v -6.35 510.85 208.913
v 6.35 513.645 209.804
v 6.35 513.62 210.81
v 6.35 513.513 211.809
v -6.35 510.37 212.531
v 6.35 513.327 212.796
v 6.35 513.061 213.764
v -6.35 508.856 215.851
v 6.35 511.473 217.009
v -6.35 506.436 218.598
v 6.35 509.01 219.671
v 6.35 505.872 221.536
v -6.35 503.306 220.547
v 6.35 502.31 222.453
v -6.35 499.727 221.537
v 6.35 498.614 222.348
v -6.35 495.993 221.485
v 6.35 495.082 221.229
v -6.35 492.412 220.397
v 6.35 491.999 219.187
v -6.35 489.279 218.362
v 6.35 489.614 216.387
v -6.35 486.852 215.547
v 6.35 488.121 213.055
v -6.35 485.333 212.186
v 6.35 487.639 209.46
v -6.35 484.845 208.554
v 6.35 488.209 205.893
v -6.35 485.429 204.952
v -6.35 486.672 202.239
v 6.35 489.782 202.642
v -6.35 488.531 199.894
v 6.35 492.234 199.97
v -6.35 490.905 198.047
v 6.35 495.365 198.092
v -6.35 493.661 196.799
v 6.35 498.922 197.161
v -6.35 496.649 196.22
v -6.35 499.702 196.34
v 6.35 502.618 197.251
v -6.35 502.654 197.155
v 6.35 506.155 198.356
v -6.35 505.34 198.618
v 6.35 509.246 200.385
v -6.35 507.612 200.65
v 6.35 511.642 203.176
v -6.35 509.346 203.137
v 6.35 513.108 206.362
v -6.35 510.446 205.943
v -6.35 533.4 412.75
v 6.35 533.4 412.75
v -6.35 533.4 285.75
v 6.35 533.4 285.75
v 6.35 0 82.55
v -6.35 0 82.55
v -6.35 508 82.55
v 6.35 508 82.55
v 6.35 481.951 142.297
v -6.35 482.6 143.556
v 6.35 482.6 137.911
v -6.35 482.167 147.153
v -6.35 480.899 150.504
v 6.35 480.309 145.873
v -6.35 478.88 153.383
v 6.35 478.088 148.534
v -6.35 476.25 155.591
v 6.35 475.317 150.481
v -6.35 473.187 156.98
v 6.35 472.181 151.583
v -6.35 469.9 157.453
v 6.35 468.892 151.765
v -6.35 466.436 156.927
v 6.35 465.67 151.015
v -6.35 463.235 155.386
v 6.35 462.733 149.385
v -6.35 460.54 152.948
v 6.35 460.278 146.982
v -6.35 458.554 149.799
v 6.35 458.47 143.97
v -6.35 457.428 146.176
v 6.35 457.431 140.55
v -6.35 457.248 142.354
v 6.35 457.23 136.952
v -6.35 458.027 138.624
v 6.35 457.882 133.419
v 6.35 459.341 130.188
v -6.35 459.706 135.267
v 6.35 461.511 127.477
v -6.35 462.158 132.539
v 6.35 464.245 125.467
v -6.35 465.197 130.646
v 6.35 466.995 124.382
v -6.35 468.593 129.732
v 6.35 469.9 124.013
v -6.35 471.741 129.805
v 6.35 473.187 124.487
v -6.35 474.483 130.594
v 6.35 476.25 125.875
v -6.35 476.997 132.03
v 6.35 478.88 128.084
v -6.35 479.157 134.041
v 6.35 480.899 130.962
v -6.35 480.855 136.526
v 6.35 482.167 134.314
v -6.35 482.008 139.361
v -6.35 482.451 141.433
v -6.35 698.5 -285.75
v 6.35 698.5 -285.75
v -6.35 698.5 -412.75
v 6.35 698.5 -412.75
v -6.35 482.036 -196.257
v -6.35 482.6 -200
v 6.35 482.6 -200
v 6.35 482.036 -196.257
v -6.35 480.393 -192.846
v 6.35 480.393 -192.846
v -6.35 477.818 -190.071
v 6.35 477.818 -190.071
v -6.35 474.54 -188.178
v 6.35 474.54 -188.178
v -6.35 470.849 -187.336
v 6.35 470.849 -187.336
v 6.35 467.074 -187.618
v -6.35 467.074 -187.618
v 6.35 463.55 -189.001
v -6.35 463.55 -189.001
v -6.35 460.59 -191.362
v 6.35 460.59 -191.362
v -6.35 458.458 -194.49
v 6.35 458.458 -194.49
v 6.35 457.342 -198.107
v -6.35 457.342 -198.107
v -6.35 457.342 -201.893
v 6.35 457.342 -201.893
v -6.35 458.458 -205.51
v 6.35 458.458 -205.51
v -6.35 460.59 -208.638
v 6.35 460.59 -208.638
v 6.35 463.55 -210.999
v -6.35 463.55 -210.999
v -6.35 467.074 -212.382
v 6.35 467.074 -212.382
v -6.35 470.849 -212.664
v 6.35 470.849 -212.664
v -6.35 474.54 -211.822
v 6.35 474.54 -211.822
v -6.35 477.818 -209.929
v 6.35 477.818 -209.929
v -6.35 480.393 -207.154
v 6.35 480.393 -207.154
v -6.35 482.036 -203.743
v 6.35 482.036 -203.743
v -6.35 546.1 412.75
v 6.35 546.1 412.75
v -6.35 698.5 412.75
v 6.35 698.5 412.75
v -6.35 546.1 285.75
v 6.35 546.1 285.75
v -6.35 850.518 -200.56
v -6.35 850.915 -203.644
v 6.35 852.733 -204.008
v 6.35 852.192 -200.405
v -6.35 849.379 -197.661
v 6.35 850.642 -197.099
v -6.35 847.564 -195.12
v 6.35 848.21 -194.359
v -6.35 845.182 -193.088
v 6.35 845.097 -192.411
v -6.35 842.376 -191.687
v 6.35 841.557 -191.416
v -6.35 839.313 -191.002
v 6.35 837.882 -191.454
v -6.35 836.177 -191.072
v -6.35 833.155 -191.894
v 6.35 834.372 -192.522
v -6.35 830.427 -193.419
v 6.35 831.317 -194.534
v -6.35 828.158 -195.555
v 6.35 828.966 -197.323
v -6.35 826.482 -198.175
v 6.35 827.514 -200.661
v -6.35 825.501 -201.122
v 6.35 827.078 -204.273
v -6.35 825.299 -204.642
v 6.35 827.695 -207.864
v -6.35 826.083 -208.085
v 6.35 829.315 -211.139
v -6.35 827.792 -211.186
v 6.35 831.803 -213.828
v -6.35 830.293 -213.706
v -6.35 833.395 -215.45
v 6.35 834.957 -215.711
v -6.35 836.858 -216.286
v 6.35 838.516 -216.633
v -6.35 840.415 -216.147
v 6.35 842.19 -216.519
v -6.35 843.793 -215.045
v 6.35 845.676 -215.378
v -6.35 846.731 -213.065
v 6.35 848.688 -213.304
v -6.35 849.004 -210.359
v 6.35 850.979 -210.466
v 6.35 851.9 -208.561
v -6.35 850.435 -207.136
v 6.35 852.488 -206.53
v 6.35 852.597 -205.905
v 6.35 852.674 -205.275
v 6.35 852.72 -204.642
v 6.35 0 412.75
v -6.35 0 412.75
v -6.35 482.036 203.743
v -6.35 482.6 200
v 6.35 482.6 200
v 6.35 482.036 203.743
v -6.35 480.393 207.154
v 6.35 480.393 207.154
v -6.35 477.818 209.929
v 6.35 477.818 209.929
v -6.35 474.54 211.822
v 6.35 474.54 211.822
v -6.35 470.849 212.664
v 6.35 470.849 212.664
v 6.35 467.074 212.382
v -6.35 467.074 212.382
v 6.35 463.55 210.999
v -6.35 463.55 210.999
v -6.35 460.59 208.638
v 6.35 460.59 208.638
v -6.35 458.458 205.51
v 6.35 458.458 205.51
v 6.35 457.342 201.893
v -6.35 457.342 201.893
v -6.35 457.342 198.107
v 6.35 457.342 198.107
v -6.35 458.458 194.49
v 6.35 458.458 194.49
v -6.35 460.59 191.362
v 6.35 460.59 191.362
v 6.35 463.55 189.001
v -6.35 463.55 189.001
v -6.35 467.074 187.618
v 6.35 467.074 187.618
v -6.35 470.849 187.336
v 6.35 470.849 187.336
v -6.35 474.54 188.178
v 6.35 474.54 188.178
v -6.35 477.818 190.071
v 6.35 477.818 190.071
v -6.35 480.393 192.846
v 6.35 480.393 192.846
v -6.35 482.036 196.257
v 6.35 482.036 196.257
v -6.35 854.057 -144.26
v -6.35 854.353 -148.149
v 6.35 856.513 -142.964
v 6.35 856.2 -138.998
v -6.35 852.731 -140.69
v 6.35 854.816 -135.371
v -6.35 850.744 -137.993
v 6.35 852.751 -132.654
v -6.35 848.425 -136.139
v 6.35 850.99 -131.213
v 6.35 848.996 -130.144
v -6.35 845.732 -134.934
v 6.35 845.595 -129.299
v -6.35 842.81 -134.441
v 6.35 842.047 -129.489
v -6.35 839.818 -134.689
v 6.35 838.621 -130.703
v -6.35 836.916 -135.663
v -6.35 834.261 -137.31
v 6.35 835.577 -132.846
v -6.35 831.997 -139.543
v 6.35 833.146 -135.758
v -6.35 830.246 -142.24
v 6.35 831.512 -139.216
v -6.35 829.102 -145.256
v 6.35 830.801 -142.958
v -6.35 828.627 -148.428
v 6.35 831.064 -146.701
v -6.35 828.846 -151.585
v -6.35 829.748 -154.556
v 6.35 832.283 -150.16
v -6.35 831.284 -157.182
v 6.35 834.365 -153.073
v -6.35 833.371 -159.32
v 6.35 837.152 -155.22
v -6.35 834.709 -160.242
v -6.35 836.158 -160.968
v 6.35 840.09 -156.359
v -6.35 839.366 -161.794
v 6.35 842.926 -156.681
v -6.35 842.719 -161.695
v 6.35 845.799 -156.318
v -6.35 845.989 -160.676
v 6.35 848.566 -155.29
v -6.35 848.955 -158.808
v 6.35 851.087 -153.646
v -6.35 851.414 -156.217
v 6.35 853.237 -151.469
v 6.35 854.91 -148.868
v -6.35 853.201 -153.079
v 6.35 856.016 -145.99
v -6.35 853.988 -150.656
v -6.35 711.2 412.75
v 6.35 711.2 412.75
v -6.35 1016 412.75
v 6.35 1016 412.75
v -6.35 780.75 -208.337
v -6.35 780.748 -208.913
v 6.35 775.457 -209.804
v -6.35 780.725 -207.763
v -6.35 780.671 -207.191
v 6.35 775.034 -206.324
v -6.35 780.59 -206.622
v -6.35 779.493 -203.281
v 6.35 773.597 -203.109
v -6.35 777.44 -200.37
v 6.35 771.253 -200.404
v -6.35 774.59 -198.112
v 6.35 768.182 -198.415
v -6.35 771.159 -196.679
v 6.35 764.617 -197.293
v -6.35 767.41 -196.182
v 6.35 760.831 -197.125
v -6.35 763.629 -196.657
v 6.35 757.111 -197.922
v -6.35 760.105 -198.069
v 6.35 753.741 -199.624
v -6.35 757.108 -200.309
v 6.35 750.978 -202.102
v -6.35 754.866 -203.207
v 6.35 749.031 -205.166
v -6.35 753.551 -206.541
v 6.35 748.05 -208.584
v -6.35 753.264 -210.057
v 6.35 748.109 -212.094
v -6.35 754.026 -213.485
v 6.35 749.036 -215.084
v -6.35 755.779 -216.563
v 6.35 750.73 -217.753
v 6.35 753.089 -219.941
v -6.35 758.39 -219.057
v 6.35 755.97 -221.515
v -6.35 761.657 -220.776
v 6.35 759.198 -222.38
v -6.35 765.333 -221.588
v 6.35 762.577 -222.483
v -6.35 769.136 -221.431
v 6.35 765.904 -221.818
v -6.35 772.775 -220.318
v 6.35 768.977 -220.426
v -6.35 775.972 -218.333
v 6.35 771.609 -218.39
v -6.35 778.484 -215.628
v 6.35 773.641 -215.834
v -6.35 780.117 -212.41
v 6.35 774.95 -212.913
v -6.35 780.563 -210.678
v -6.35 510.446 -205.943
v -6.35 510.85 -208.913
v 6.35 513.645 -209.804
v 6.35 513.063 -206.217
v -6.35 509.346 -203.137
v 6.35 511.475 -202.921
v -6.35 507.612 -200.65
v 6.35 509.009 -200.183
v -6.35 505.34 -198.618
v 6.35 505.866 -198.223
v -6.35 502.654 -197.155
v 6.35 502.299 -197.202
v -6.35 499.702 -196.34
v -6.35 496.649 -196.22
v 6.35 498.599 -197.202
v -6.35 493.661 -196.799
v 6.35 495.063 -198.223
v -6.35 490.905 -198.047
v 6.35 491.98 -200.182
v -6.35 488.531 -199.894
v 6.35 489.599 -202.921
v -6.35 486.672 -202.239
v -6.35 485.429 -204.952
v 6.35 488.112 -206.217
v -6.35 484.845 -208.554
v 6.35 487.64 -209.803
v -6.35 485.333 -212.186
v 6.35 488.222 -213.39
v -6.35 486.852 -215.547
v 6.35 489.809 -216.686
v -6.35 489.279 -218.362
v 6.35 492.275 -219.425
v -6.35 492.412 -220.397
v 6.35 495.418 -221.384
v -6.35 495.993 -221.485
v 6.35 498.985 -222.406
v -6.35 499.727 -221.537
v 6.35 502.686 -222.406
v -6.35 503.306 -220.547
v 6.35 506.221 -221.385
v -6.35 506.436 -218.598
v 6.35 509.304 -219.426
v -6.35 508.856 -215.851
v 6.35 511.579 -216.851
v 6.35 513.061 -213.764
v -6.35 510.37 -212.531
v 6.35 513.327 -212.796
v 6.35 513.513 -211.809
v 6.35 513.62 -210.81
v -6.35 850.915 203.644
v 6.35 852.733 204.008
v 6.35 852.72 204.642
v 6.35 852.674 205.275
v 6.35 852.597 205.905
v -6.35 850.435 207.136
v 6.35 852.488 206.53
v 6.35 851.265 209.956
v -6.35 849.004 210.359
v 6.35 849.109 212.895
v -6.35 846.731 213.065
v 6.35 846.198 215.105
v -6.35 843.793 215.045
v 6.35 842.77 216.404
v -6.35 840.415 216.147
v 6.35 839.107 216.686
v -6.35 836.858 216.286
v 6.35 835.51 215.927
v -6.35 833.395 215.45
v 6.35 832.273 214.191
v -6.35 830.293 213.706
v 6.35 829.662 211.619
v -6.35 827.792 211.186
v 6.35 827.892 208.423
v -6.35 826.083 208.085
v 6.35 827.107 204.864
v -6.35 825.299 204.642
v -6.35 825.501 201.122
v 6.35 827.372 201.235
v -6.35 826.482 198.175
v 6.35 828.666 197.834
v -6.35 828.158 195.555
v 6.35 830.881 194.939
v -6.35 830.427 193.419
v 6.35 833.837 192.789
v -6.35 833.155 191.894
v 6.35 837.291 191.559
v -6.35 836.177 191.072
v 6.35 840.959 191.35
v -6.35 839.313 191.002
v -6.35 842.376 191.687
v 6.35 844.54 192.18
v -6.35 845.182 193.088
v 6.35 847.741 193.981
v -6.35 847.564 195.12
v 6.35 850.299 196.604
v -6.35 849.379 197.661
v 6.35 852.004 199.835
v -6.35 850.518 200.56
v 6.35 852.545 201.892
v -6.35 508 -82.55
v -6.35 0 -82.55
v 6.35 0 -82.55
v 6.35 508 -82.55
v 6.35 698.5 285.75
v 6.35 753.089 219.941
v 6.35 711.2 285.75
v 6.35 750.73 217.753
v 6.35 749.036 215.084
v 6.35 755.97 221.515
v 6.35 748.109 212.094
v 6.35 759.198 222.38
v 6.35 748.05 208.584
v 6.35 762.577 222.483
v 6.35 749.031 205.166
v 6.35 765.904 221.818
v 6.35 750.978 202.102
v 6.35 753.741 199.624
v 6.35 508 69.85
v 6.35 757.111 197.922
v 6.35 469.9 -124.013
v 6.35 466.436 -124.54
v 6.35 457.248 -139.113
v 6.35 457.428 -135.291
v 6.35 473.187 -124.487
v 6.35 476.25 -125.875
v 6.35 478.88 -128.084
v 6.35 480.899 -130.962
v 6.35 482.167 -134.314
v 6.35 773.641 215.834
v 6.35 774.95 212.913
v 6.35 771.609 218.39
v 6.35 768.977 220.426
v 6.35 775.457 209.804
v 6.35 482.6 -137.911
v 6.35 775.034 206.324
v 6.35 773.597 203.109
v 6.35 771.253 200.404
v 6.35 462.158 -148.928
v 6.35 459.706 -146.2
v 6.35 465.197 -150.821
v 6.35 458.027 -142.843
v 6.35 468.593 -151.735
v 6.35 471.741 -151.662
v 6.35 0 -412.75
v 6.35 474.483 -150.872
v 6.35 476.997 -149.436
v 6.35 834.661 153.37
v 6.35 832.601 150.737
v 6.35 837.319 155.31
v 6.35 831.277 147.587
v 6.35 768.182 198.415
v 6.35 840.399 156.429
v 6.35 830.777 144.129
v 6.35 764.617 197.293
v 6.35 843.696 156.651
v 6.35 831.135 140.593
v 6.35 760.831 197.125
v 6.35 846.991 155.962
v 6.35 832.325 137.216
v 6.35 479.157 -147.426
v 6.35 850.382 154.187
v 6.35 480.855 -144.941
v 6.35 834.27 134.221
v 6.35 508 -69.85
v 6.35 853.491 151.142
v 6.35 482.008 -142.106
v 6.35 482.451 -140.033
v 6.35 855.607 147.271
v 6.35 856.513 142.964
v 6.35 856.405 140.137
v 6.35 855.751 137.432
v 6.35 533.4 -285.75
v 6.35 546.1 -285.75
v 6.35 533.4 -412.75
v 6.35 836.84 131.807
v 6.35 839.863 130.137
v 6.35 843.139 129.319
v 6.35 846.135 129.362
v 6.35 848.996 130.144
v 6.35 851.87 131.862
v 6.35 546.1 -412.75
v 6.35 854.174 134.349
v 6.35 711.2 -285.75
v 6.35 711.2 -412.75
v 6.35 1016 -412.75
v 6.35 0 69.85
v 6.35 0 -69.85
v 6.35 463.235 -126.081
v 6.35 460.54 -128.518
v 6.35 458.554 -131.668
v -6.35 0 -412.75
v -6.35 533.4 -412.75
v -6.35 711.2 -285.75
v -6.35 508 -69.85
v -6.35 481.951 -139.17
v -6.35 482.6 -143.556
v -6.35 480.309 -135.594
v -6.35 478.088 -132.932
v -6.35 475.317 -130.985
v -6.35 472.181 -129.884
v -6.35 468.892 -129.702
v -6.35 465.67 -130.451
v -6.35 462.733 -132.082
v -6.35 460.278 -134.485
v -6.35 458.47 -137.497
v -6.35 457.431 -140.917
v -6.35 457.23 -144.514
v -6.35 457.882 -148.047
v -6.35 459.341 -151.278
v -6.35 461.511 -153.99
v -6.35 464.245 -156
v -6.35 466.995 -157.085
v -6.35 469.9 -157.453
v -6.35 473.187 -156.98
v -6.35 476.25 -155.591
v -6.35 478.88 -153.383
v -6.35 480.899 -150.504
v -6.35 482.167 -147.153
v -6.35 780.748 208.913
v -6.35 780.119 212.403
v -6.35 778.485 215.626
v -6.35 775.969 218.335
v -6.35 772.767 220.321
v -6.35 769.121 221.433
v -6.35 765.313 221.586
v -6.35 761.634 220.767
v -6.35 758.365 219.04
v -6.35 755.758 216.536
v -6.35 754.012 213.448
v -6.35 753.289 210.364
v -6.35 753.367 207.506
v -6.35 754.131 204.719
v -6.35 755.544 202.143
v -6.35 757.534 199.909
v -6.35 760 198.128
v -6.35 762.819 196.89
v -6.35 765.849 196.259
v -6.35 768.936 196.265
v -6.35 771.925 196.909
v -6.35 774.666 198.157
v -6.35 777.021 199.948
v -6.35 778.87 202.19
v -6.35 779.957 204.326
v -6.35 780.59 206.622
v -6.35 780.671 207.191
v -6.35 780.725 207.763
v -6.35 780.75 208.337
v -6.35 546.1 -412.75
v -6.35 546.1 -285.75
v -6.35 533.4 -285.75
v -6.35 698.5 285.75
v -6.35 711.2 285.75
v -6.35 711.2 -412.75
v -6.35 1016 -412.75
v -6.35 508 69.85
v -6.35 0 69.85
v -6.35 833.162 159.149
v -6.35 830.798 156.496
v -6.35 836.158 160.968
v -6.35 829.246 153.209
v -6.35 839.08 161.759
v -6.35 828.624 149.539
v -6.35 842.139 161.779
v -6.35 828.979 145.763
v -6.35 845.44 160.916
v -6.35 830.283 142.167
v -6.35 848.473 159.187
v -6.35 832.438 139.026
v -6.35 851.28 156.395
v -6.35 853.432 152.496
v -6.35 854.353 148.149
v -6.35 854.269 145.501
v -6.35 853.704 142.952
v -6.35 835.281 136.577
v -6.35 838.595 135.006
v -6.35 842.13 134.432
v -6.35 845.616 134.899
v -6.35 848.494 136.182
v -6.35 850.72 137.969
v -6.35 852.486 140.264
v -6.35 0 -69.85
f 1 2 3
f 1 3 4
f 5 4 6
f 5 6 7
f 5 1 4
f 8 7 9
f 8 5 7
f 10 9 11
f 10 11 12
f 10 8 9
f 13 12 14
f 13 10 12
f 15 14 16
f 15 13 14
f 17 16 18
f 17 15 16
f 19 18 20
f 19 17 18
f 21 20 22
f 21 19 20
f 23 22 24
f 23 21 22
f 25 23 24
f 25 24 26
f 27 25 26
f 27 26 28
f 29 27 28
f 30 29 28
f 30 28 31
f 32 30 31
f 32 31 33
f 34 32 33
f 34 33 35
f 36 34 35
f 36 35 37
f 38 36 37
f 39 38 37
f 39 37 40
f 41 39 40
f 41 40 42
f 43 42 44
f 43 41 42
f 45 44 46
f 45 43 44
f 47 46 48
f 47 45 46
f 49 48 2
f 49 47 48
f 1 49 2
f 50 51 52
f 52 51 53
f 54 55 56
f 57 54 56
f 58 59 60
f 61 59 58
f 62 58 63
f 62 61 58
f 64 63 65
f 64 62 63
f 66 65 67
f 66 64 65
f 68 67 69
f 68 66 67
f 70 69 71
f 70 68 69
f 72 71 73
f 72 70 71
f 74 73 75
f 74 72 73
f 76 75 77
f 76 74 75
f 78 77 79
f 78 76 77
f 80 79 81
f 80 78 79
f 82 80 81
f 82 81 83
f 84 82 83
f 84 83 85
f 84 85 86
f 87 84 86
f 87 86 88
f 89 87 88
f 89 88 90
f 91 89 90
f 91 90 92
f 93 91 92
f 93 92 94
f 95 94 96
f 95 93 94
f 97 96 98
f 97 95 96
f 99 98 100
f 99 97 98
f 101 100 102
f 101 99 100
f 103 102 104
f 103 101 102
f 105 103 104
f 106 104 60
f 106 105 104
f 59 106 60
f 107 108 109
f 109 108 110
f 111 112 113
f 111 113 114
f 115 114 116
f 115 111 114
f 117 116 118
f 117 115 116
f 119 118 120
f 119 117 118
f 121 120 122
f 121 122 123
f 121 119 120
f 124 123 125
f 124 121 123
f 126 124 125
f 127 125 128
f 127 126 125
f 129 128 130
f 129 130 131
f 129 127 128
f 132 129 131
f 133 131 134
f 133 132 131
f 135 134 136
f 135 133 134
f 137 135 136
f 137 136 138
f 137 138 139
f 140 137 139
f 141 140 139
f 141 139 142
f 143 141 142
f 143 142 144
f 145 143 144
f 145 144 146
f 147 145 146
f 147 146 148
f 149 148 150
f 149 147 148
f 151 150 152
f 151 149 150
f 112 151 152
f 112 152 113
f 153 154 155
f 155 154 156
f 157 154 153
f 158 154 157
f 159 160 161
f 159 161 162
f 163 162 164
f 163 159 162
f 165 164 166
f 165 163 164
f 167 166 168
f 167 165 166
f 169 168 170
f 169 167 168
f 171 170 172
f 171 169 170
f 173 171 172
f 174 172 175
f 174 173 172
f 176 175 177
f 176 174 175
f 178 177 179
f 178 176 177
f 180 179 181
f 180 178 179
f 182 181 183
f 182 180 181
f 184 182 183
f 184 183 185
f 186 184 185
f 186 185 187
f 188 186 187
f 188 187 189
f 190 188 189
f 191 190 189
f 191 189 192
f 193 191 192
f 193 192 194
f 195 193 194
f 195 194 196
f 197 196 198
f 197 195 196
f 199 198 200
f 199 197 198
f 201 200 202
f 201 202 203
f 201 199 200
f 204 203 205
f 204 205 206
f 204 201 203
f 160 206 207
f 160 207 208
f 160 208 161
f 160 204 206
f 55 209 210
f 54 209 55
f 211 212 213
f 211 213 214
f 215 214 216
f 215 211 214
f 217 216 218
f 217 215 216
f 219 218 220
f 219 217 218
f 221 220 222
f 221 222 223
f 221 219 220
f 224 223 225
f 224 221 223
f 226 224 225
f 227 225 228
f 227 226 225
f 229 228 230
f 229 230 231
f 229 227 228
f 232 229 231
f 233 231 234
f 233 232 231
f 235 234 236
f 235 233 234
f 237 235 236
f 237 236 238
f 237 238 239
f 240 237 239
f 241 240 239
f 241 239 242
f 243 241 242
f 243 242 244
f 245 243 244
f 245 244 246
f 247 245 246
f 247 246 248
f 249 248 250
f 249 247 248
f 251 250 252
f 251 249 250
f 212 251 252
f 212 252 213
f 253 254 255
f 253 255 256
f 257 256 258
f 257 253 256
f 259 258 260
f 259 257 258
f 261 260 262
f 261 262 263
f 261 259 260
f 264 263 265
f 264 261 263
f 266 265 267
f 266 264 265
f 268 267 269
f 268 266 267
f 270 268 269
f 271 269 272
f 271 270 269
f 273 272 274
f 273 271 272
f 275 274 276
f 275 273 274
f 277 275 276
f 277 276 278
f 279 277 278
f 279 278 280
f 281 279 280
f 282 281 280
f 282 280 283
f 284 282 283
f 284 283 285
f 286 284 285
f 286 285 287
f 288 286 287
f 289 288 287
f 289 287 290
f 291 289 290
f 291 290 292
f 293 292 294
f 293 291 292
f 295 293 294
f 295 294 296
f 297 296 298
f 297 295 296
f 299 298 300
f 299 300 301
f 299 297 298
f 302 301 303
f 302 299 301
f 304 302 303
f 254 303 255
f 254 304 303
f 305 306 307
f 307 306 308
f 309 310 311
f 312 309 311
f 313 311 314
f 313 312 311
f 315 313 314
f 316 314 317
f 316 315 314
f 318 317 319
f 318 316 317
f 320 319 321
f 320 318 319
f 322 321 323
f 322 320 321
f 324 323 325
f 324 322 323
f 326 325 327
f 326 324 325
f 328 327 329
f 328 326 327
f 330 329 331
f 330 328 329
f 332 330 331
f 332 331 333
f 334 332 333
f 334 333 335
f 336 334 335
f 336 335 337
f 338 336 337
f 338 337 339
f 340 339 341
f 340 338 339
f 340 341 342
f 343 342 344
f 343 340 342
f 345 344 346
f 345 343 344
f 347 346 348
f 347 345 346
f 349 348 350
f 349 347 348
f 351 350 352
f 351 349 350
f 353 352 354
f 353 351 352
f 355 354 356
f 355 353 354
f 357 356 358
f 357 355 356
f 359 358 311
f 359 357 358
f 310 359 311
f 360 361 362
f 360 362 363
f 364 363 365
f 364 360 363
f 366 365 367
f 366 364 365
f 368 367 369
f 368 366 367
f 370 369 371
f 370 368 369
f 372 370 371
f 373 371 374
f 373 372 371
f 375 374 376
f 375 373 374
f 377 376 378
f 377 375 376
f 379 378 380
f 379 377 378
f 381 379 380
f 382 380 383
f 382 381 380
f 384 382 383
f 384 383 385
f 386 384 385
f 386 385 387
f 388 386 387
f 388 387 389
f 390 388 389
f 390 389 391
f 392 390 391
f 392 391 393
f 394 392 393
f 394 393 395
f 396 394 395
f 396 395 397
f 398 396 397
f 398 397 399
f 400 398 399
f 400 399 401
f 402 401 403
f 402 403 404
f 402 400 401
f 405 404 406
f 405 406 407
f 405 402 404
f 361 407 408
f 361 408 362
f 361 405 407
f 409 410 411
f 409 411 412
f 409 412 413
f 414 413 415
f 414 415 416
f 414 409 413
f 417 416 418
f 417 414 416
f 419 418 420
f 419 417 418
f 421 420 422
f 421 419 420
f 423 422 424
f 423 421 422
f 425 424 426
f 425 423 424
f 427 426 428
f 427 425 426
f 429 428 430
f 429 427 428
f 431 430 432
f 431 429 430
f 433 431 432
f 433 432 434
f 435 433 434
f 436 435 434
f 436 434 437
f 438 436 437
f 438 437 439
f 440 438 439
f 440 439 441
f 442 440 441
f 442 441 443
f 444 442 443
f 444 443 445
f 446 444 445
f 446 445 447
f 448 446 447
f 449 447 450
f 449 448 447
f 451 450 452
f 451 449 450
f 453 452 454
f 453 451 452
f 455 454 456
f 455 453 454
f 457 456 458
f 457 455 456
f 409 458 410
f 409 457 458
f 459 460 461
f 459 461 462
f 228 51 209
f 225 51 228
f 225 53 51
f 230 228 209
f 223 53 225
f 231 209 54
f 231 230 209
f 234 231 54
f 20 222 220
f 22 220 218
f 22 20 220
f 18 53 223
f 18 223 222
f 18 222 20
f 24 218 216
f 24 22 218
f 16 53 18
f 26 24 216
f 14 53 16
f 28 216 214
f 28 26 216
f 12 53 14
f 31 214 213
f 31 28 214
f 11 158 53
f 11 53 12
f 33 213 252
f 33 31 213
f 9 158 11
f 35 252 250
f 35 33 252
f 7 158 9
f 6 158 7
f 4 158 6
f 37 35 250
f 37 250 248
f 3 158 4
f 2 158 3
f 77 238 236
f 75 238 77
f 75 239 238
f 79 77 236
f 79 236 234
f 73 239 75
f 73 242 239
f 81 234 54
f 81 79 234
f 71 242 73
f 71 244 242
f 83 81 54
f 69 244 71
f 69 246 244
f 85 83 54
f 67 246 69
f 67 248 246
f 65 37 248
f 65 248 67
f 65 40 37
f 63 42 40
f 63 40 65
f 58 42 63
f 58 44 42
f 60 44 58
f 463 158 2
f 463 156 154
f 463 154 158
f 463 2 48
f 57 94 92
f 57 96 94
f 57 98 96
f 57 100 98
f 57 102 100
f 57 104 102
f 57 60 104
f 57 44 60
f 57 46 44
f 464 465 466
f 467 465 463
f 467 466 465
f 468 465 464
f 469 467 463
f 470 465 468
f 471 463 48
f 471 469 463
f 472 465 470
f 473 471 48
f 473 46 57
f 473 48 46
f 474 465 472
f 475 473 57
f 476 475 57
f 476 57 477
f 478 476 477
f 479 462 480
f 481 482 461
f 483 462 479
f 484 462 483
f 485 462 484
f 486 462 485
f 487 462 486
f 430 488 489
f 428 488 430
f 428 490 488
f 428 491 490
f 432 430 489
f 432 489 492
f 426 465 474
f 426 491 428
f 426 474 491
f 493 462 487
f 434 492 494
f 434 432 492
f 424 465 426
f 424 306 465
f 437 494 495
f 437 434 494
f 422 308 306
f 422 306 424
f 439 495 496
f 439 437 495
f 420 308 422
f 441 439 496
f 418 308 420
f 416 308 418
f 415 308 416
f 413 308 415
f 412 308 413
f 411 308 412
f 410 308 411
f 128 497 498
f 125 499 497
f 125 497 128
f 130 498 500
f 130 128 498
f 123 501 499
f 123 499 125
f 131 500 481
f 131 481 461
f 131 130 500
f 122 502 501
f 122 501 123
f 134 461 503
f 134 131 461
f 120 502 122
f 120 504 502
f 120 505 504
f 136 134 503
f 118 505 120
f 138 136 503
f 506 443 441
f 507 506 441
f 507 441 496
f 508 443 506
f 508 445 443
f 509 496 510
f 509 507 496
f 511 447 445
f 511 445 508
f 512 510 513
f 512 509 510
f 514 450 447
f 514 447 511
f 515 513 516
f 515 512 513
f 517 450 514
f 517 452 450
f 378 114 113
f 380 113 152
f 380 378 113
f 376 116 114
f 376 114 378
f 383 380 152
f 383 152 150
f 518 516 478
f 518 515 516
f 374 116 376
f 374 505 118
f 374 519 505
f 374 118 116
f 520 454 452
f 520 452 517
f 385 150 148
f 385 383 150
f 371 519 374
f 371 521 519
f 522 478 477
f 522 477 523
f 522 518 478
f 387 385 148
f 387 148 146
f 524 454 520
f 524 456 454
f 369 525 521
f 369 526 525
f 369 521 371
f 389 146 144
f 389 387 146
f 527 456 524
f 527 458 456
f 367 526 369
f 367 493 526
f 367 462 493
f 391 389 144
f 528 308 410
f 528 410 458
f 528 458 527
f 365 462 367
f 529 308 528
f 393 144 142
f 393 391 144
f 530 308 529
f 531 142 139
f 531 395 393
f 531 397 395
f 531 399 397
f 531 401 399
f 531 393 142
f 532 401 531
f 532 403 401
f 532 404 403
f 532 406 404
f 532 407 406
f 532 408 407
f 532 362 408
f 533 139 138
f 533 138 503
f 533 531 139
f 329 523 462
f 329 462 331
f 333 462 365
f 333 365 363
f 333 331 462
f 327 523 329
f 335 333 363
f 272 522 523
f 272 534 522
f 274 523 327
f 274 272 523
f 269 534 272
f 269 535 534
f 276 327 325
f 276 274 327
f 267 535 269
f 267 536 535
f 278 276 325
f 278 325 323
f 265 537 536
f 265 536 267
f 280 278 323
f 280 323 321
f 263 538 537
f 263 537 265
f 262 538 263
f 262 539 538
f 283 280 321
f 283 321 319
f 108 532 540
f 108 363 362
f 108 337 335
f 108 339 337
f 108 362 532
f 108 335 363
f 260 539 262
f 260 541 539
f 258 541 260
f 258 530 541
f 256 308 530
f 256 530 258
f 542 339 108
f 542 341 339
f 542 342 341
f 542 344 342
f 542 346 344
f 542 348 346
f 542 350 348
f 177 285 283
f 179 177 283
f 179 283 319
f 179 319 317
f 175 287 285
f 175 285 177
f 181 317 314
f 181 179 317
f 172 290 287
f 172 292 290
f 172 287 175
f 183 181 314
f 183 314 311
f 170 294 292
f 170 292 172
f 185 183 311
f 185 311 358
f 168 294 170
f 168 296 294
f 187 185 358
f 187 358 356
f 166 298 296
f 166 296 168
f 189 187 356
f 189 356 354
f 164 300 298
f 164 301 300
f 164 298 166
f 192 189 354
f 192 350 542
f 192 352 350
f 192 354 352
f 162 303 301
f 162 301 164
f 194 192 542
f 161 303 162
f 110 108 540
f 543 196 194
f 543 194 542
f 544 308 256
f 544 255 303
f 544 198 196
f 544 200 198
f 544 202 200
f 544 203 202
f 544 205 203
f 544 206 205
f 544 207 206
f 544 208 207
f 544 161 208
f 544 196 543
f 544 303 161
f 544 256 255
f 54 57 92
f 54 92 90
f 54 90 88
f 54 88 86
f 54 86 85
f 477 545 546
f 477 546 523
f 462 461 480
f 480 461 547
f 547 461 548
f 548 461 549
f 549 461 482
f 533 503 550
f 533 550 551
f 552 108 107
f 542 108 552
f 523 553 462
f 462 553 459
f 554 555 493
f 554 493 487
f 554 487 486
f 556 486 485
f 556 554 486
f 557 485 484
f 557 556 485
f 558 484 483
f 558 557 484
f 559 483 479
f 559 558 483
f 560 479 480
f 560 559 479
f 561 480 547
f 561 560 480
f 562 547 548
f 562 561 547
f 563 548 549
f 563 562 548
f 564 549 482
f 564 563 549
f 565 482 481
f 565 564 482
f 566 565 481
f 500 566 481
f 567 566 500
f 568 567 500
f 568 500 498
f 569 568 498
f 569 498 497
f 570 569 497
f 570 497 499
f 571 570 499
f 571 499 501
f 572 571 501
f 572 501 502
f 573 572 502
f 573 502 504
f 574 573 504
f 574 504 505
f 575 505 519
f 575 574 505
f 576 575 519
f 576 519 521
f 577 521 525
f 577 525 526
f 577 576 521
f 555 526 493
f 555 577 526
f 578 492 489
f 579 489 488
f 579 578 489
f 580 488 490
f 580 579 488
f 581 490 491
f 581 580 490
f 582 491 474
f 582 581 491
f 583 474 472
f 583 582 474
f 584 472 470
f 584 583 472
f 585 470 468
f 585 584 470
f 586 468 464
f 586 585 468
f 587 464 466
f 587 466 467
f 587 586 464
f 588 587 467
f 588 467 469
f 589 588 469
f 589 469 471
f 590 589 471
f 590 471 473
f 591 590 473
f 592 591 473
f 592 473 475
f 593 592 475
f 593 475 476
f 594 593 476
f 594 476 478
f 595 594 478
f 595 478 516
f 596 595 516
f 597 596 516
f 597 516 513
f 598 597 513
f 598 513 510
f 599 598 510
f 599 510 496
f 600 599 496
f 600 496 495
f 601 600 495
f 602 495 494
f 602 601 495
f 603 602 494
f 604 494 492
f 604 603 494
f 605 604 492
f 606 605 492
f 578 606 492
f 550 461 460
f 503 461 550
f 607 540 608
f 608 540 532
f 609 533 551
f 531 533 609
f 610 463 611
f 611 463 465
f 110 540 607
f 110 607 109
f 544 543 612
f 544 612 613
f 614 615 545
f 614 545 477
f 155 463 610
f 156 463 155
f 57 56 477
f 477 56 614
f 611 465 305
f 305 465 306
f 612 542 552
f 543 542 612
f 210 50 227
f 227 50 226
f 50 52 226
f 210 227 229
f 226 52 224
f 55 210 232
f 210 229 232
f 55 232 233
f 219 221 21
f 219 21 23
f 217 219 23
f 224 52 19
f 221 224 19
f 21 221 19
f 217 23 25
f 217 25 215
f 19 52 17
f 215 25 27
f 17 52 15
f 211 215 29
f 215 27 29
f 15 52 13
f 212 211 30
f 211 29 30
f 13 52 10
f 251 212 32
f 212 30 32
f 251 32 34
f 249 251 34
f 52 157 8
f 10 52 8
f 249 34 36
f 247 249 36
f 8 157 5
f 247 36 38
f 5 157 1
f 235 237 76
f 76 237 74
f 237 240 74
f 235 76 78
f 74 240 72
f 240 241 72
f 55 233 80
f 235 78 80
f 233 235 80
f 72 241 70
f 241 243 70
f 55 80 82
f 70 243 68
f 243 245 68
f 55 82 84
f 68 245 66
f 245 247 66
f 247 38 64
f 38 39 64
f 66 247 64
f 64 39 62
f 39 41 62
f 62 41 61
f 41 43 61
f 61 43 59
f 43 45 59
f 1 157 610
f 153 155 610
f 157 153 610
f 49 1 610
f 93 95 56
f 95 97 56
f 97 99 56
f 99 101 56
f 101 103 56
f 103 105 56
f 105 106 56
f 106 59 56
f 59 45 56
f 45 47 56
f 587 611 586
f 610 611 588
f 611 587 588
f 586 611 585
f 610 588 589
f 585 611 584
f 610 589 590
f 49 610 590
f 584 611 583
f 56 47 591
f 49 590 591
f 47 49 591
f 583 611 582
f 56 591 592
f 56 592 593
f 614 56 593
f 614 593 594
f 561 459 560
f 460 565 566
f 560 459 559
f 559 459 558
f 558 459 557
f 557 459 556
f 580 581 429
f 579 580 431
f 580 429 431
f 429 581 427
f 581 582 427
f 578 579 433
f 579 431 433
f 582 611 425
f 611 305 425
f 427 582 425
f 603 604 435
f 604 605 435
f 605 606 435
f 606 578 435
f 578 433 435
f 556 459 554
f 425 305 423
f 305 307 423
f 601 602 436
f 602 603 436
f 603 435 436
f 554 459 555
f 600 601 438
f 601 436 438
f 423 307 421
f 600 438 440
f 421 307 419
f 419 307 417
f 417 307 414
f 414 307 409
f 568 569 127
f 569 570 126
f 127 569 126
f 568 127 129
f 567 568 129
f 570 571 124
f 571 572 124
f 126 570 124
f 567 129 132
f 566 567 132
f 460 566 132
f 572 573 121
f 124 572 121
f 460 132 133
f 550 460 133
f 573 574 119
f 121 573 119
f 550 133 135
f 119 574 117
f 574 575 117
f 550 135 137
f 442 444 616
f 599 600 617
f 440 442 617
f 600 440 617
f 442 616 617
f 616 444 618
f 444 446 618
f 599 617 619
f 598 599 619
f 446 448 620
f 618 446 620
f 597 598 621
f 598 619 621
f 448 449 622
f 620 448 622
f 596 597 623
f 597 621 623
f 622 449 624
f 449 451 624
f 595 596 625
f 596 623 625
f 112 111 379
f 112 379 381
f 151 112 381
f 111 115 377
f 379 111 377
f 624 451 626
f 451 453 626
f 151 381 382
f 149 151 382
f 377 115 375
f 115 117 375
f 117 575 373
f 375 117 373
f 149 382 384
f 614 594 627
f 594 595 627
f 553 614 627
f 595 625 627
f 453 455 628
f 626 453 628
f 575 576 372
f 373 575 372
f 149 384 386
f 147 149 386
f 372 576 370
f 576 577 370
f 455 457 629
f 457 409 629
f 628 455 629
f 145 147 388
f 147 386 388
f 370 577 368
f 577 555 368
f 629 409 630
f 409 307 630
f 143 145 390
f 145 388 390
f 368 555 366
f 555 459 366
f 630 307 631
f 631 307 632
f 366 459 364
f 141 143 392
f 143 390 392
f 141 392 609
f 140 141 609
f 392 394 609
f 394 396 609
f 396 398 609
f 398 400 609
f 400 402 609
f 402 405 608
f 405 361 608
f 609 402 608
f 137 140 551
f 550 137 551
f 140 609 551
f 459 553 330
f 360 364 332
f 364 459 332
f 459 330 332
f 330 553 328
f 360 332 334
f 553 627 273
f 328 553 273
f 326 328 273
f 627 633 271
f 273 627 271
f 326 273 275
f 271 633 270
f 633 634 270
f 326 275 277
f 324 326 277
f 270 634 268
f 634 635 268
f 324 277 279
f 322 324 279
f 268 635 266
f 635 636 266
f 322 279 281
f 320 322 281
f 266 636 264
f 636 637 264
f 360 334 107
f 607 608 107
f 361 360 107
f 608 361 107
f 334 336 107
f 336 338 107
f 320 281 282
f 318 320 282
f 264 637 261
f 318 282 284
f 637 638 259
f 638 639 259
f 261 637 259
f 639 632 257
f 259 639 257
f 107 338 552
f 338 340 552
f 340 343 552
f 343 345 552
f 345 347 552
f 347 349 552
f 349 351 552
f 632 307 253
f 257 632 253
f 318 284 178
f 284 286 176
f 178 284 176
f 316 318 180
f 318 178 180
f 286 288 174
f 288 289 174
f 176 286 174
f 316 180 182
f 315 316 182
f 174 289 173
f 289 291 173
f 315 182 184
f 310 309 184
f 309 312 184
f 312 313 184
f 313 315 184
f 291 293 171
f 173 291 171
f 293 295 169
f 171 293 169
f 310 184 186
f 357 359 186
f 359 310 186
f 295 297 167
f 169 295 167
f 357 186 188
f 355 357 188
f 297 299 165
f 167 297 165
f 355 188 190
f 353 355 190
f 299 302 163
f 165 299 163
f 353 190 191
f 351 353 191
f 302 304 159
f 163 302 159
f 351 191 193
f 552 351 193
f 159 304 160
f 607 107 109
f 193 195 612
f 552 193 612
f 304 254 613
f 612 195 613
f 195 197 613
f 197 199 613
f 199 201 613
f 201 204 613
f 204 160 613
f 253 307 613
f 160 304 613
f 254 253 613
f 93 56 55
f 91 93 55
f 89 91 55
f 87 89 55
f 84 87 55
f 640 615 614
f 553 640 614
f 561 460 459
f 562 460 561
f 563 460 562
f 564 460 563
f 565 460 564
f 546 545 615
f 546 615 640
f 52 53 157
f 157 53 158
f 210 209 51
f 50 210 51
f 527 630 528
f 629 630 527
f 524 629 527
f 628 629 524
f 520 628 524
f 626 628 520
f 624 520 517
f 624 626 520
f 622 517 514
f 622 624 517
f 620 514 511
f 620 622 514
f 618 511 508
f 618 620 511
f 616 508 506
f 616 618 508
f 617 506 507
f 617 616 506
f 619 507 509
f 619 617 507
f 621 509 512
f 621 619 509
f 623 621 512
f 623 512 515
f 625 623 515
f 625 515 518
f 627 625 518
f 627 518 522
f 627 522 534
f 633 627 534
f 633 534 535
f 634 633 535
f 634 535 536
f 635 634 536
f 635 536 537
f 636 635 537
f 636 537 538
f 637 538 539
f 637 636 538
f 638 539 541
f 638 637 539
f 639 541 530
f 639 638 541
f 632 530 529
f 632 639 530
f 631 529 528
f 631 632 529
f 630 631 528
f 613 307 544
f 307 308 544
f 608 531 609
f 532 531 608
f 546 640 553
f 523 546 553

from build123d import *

# Parameters (mm, degrees)
SKETCH1_W               = 825.5
SKETCH1_H               = 1016
BOSS_EXTRUDE1_DEPTH     = 6.35
CAVITY1_START           = -69.750581005
CAVITY1_OUTLINE_R       = 12.7
CAVITY1_DEPTH           = 25.186721765
CAVITY1_2_OUTLINE_R     = 12.7
CAVITY1_2_DEPTH         = 25.186721765
CAVITY1_START_2         = 64.130873345
CAVITY1_3_OUTLINE_R     = 12.7
CAVITY1_3_DEPTH         = 25.120529807
CAVITY1_4_OUTLINE_R     = 12.7
CAVITY1_4_DEPTH         = 25.120529807
CAVITY1_START_3         = -292.036063147
CAVITY1_5_OUTLINE_R     = 12.7
CAVITY1_5_DEPTH         = 24.516904948
CAVITY1_6_OUTLINE_R     = 12.7
CAVITY1_6_DEPTH         = 24.516904948
CAVITY1_START_4         = 116.389417883
CAVITY1_7_OUTLINE_R     = 12.7
CAVITY1_7_DEPTH         = 16.544031778
CAVITY1_8_OUTLINE_R     = 12.7
CAVITY1_8_DEPTH         = 16.544031778
CAVITY1_START_5         = 111.910581246
CAVITY1_9_OUTLINE_R     = 12.7
CAVITY1_9_DEPTH         = 18.901264253
CAVITY1_START_6         = -6.35
CAVITY1_10_OUTLINE_R    = 12.7
CAVITY1_10_DEPTH        = 12.7
CAVITY1_11_OUTLINE_R    = 12.7
CAVITY1_11_DEPTH        = 18.901264253
CUT_EXTRUDE4_DEPTH      = 1097.658052904
CUT_EXTRUDE4_DEPTH_BACK = 1097.658052904
SKETCH5_W               = 12.7
SKETCH5_H               = 508
CUT_EXTRUDE5_DEPTH      = 1097.658052904
CUT_EXTRUDE5_DEPTH_BACK = 1097.658052904
SKETCH6_W               = 12.7
SKETCH6_H               = 508
SKETCH7_W               = 127
SKETCH7_H               = 12.7
CUT_EXTRUDE6_DEPTH      = 1097.658052904
SKETCH8_W               = 127
SKETCH8_H               = 12.7
CUT_EXTRUDE7_DEPTH      = 1097.658052904


# Read off the part's stored shape, not the designer's step: Cavity1
with BuildPart() as part:
    # Sketch1 → Boss-Extrude1 (new, symmetric)
    with BuildSketch(Plane(origin=(0, 0, 0), x_dir=(0, 0, -1), z_dir=(1, 0, 0))):
        with Locations((0, 508)):
            Rectangle(SKETCH1_W, SKETCH1_H)
    extrude(amount=BOSS_EXTRUDE1_DEPTH, both=True)

    # Cavity1 outline → Cavity1 (cut)
    with BuildSketch(Plane(origin=(0, 0, 0), x_dir=(0, 1, 0), z_dir=(0.9138115486202553, 0, 0.4061384660534521)).offset(CAVITY1_START)):
        with Locations((469.9, -128.603745276)):
            Circle(CAVITY1_OUTLINE_R)
    extrude(amount=CAVITY1_DEPTH, mode=Mode.SUBTRACT)

    # Cavity1 2 outline → Cavity1 2 (cut)
    with BuildSketch(Plane(origin=(0, 0, 0), x_dir=(0, 1, 0), z_dir=(0.913811548620257, 0, -0.406138466053448)).offset(CAVITY1_START)):
        with Locations((469.9, 128.603745276)):
            Circle(CAVITY1_2_OUTLINE_R)
    extrude(amount=CAVITY1_2_DEPTH, mode=Mode.SUBTRACT)

    # Cavity1 3 outline → Cavity1 3 (cut)
    with BuildSketch(Plane(origin=(0, 0, 0), x_dir=(-0.14398491314217557, 0.9878322579058099, -0.05878584037121407), z_dir=(0.9145455226247352, 0.15552308587701602, 0.37338861365384507)).offset(CAVITY1_START_2)):
        with Locations((840.881224499, -134.757426505)):
            Circle(CAVITY1_3_OUTLINE_R)
    extrude(amount=CAVITY1_3_DEPTH, mode=Mode.SUBTRACT)

    # Cavity1 4 outline → Cavity1 4 (cut)
    with BuildSketch(Plane(origin=(0, 0, 0), x_dir=(-0.14398491314217668, 0.9878322579058096, 0.05878584037121399), z_dir=(0.9145455226247362, 0.15552308587701702, -0.37338861365384207)).offset(CAVITY1_START_2)):
        with Locations((840.881224499, 134.757426505)):
            Circle(CAVITY1_4_OUTLINE_R)
    extrude(amount=CAVITY1_4_DEPTH, mode=Mode.SUBTRACT)

    # Cavity1 5 outline → Cavity1 5 (cut)
    with BuildSketch(Plane(origin=(0, 0, 0), x_dir=(0.3827993278239342, 0.9234408320803411, 0.026864554050110373), z_dir=(0.9211751685610859, -0.38374083656390695, 0.0646473447226402)).offset(CAVITY1_START_3)):
        with Locations((711.455758667, 208.844736372)):
            Circle(CAVITY1_5_OUTLINE_R)
    extrude(amount=CAVITY1_5_DEPTH, mode=Mode.SUBTRACT)

    # Cavity1 6 outline → Cavity1 6 (cut)
    with BuildSketch(Plane(origin=(0, 0, 0), x_dir=(0.3827993278239134, 0.9234408320803503, -0.02686455405009277), z_dir=(0.9211751685610978, -0.3837408365638849, -0.06464734472260218)).offset(CAVITY1_START_3)):
        with Locations((711.455758667, -208.844736372)):
            Circle(CAVITY1_6_OUTLINE_R)
    extrude(amount=CAVITY1_6_DEPTH, mode=Mode.SUBTRACT)

    # Cavity1 7 outline → Cavity1 7 (cut)
    with BuildSketch(Plane(origin=(0, 0, 0), x_dir=(-0.14162907065889588, 0.989911458049715, -0.00406344265182396), z_dir=(0.9895042824022925, 0.14168735025360304, 0.028389608761606212)).offset(CAVITY1_START_4)):
        with Locations((829.701952497, 203.742071242)):
            Circle(CAVITY1_7_OUTLINE_R)
    extrude(amount=CAVITY1_7_DEPTH, mode=Mode.SUBTRACT)

    # Cavity1 8 outline → Cavity1 8 (cut)
    with BuildSketch(Plane(origin=(0, 0, 0), x_dir=(-0.1416290706588989, 0.9899114580497147, 0.00406344265182273), z_dir=(0.9895042824022923, 0.14168735025360601, -0.028389608761597008)).offset(CAVITY1_START_4)):
        with Locations((829.701952497, -203.742071242)):
            Circle(CAVITY1_8_OUTLINE_R)
    extrude(amount=CAVITY1_8_DEPTH, mode=Mode.SUBTRACT)

    # Cavity1 9 outline → Cavity1 9 (cut)
    with BuildSketch(Plane(origin=(0, 0, 0), x_dir=(-0.2138887427613121, 0.9767426935099688, 0.015010542790871387), z_dir=(0.9743462537907107, 0.21441480983106392, -0.06837884942814358)).offset(CAVITY1_START_5)):
        with Locations((484.491346969, -208.844736372)):
            Circle(CAVITY1_9_OUTLINE_R)
    extrude(amount=CAVITY1_9_DEPTH, mode=Mode.SUBTRACT)

    # Cavity1 10 outline → Cavity1 10 (cut)
    with BuildSketch(Plane.YZ.offset(CAVITY1_START_6)):
        with Locations((469.9, -200)):
            Circle(CAVITY1_10_OUTLINE_R)
        with Locations((469.9, 200)):
            Circle(CAVITY1_10_OUTLINE_R)
    extrude(amount=CAVITY1_10_DEPTH, mode=Mode.SUBTRACT)

    # Cavity1 11 outline → Cavity1 11 (cut)
    with BuildSketch(Plane(origin=(0, 0, 0), x_dir=(-0.21388874276128378, 0.9767426935099748, -0.015010542790877034), z_dir=(0.9743462537907144, 0.21441480983103609, 0.06837884942817862)).offset(CAVITY1_START_5)):
        with Locations((484.491346969, 208.844736372)):
            Circle(CAVITY1_11_OUTLINE_R)
    extrude(amount=CAVITY1_11_DEPTH, mode=Mode.SUBTRACT)

    # Sketch5 → Cut-Extrude4 (cut, two sides: drawn at the far end of the back side and taken through both)
    with BuildSketch(Plane(origin=(0, 0, 0), x_dir=(0, 0, -1), z_dir=(1, 0, 0)).offset(-CUT_EXTRUDE4_DEPTH_BACK)):
        with Locations((76.2, 254)):
            Rectangle(SKETCH5_W, SKETCH5_H)
    extrude(amount=CUT_EXTRUDE4_DEPTH + CUT_EXTRUDE4_DEPTH_BACK, mode=Mode.SUBTRACT)

    # Sketch6 → Cut-Extrude5 (cut, two sides: drawn at the far end of the back side and taken through both)
    with BuildSketch(Plane(origin=(0, 0, 0), x_dir=(0, 0, -1), z_dir=(1, 0, 0)).offset(-CUT_EXTRUDE5_DEPTH_BACK)):
        with Locations((-76.2, 254)):
            Rectangle(SKETCH6_W, SKETCH6_H)
    extrude(amount=CUT_EXTRUDE5_DEPTH + CUT_EXTRUDE5_DEPTH_BACK, mode=Mode.SUBTRACT)

    # Sketch7 → Cut-Extrude6 (cut, symmetric)
    with BuildSketch(Plane(origin=(0, 0, 0), x_dir=(0, 0, -1), z_dir=(1, 0, 0))):
        with Locations((349.25, 704.85)):
            Rectangle(SKETCH7_W, SKETCH7_H)
    cut_extrude6 = extrude(amount=CUT_EXTRUDE6_DEPTH, both=True, mode=Mode.SUBTRACT)

    # Sketch8 → Cut-Extrude7 (cut, symmetric)
    with BuildSketch(Plane(origin=(0, 0, 0), x_dir=(0, 0, -1), z_dir=(1, 0, 0))):
        with Locations((-349.25, 539.75)):
            Rectangle(SKETCH8_W, SKETCH8_H)
    cut_extrude7 = extrude(amount=CUT_EXTRUDE7_DEPTH, both=True, mode=Mode.SUBTRACT)

    # Mirror1: Cut-Extrude6, Cut-Extrude7 across plane
    add(cut_extrude6.mirror(Plane.XY), mode=Mode.SUBTRACT)
    add(cut_extrude7.mirror(Plane.XY), mode=Mode.SUBTRACT)


solid = part.part
